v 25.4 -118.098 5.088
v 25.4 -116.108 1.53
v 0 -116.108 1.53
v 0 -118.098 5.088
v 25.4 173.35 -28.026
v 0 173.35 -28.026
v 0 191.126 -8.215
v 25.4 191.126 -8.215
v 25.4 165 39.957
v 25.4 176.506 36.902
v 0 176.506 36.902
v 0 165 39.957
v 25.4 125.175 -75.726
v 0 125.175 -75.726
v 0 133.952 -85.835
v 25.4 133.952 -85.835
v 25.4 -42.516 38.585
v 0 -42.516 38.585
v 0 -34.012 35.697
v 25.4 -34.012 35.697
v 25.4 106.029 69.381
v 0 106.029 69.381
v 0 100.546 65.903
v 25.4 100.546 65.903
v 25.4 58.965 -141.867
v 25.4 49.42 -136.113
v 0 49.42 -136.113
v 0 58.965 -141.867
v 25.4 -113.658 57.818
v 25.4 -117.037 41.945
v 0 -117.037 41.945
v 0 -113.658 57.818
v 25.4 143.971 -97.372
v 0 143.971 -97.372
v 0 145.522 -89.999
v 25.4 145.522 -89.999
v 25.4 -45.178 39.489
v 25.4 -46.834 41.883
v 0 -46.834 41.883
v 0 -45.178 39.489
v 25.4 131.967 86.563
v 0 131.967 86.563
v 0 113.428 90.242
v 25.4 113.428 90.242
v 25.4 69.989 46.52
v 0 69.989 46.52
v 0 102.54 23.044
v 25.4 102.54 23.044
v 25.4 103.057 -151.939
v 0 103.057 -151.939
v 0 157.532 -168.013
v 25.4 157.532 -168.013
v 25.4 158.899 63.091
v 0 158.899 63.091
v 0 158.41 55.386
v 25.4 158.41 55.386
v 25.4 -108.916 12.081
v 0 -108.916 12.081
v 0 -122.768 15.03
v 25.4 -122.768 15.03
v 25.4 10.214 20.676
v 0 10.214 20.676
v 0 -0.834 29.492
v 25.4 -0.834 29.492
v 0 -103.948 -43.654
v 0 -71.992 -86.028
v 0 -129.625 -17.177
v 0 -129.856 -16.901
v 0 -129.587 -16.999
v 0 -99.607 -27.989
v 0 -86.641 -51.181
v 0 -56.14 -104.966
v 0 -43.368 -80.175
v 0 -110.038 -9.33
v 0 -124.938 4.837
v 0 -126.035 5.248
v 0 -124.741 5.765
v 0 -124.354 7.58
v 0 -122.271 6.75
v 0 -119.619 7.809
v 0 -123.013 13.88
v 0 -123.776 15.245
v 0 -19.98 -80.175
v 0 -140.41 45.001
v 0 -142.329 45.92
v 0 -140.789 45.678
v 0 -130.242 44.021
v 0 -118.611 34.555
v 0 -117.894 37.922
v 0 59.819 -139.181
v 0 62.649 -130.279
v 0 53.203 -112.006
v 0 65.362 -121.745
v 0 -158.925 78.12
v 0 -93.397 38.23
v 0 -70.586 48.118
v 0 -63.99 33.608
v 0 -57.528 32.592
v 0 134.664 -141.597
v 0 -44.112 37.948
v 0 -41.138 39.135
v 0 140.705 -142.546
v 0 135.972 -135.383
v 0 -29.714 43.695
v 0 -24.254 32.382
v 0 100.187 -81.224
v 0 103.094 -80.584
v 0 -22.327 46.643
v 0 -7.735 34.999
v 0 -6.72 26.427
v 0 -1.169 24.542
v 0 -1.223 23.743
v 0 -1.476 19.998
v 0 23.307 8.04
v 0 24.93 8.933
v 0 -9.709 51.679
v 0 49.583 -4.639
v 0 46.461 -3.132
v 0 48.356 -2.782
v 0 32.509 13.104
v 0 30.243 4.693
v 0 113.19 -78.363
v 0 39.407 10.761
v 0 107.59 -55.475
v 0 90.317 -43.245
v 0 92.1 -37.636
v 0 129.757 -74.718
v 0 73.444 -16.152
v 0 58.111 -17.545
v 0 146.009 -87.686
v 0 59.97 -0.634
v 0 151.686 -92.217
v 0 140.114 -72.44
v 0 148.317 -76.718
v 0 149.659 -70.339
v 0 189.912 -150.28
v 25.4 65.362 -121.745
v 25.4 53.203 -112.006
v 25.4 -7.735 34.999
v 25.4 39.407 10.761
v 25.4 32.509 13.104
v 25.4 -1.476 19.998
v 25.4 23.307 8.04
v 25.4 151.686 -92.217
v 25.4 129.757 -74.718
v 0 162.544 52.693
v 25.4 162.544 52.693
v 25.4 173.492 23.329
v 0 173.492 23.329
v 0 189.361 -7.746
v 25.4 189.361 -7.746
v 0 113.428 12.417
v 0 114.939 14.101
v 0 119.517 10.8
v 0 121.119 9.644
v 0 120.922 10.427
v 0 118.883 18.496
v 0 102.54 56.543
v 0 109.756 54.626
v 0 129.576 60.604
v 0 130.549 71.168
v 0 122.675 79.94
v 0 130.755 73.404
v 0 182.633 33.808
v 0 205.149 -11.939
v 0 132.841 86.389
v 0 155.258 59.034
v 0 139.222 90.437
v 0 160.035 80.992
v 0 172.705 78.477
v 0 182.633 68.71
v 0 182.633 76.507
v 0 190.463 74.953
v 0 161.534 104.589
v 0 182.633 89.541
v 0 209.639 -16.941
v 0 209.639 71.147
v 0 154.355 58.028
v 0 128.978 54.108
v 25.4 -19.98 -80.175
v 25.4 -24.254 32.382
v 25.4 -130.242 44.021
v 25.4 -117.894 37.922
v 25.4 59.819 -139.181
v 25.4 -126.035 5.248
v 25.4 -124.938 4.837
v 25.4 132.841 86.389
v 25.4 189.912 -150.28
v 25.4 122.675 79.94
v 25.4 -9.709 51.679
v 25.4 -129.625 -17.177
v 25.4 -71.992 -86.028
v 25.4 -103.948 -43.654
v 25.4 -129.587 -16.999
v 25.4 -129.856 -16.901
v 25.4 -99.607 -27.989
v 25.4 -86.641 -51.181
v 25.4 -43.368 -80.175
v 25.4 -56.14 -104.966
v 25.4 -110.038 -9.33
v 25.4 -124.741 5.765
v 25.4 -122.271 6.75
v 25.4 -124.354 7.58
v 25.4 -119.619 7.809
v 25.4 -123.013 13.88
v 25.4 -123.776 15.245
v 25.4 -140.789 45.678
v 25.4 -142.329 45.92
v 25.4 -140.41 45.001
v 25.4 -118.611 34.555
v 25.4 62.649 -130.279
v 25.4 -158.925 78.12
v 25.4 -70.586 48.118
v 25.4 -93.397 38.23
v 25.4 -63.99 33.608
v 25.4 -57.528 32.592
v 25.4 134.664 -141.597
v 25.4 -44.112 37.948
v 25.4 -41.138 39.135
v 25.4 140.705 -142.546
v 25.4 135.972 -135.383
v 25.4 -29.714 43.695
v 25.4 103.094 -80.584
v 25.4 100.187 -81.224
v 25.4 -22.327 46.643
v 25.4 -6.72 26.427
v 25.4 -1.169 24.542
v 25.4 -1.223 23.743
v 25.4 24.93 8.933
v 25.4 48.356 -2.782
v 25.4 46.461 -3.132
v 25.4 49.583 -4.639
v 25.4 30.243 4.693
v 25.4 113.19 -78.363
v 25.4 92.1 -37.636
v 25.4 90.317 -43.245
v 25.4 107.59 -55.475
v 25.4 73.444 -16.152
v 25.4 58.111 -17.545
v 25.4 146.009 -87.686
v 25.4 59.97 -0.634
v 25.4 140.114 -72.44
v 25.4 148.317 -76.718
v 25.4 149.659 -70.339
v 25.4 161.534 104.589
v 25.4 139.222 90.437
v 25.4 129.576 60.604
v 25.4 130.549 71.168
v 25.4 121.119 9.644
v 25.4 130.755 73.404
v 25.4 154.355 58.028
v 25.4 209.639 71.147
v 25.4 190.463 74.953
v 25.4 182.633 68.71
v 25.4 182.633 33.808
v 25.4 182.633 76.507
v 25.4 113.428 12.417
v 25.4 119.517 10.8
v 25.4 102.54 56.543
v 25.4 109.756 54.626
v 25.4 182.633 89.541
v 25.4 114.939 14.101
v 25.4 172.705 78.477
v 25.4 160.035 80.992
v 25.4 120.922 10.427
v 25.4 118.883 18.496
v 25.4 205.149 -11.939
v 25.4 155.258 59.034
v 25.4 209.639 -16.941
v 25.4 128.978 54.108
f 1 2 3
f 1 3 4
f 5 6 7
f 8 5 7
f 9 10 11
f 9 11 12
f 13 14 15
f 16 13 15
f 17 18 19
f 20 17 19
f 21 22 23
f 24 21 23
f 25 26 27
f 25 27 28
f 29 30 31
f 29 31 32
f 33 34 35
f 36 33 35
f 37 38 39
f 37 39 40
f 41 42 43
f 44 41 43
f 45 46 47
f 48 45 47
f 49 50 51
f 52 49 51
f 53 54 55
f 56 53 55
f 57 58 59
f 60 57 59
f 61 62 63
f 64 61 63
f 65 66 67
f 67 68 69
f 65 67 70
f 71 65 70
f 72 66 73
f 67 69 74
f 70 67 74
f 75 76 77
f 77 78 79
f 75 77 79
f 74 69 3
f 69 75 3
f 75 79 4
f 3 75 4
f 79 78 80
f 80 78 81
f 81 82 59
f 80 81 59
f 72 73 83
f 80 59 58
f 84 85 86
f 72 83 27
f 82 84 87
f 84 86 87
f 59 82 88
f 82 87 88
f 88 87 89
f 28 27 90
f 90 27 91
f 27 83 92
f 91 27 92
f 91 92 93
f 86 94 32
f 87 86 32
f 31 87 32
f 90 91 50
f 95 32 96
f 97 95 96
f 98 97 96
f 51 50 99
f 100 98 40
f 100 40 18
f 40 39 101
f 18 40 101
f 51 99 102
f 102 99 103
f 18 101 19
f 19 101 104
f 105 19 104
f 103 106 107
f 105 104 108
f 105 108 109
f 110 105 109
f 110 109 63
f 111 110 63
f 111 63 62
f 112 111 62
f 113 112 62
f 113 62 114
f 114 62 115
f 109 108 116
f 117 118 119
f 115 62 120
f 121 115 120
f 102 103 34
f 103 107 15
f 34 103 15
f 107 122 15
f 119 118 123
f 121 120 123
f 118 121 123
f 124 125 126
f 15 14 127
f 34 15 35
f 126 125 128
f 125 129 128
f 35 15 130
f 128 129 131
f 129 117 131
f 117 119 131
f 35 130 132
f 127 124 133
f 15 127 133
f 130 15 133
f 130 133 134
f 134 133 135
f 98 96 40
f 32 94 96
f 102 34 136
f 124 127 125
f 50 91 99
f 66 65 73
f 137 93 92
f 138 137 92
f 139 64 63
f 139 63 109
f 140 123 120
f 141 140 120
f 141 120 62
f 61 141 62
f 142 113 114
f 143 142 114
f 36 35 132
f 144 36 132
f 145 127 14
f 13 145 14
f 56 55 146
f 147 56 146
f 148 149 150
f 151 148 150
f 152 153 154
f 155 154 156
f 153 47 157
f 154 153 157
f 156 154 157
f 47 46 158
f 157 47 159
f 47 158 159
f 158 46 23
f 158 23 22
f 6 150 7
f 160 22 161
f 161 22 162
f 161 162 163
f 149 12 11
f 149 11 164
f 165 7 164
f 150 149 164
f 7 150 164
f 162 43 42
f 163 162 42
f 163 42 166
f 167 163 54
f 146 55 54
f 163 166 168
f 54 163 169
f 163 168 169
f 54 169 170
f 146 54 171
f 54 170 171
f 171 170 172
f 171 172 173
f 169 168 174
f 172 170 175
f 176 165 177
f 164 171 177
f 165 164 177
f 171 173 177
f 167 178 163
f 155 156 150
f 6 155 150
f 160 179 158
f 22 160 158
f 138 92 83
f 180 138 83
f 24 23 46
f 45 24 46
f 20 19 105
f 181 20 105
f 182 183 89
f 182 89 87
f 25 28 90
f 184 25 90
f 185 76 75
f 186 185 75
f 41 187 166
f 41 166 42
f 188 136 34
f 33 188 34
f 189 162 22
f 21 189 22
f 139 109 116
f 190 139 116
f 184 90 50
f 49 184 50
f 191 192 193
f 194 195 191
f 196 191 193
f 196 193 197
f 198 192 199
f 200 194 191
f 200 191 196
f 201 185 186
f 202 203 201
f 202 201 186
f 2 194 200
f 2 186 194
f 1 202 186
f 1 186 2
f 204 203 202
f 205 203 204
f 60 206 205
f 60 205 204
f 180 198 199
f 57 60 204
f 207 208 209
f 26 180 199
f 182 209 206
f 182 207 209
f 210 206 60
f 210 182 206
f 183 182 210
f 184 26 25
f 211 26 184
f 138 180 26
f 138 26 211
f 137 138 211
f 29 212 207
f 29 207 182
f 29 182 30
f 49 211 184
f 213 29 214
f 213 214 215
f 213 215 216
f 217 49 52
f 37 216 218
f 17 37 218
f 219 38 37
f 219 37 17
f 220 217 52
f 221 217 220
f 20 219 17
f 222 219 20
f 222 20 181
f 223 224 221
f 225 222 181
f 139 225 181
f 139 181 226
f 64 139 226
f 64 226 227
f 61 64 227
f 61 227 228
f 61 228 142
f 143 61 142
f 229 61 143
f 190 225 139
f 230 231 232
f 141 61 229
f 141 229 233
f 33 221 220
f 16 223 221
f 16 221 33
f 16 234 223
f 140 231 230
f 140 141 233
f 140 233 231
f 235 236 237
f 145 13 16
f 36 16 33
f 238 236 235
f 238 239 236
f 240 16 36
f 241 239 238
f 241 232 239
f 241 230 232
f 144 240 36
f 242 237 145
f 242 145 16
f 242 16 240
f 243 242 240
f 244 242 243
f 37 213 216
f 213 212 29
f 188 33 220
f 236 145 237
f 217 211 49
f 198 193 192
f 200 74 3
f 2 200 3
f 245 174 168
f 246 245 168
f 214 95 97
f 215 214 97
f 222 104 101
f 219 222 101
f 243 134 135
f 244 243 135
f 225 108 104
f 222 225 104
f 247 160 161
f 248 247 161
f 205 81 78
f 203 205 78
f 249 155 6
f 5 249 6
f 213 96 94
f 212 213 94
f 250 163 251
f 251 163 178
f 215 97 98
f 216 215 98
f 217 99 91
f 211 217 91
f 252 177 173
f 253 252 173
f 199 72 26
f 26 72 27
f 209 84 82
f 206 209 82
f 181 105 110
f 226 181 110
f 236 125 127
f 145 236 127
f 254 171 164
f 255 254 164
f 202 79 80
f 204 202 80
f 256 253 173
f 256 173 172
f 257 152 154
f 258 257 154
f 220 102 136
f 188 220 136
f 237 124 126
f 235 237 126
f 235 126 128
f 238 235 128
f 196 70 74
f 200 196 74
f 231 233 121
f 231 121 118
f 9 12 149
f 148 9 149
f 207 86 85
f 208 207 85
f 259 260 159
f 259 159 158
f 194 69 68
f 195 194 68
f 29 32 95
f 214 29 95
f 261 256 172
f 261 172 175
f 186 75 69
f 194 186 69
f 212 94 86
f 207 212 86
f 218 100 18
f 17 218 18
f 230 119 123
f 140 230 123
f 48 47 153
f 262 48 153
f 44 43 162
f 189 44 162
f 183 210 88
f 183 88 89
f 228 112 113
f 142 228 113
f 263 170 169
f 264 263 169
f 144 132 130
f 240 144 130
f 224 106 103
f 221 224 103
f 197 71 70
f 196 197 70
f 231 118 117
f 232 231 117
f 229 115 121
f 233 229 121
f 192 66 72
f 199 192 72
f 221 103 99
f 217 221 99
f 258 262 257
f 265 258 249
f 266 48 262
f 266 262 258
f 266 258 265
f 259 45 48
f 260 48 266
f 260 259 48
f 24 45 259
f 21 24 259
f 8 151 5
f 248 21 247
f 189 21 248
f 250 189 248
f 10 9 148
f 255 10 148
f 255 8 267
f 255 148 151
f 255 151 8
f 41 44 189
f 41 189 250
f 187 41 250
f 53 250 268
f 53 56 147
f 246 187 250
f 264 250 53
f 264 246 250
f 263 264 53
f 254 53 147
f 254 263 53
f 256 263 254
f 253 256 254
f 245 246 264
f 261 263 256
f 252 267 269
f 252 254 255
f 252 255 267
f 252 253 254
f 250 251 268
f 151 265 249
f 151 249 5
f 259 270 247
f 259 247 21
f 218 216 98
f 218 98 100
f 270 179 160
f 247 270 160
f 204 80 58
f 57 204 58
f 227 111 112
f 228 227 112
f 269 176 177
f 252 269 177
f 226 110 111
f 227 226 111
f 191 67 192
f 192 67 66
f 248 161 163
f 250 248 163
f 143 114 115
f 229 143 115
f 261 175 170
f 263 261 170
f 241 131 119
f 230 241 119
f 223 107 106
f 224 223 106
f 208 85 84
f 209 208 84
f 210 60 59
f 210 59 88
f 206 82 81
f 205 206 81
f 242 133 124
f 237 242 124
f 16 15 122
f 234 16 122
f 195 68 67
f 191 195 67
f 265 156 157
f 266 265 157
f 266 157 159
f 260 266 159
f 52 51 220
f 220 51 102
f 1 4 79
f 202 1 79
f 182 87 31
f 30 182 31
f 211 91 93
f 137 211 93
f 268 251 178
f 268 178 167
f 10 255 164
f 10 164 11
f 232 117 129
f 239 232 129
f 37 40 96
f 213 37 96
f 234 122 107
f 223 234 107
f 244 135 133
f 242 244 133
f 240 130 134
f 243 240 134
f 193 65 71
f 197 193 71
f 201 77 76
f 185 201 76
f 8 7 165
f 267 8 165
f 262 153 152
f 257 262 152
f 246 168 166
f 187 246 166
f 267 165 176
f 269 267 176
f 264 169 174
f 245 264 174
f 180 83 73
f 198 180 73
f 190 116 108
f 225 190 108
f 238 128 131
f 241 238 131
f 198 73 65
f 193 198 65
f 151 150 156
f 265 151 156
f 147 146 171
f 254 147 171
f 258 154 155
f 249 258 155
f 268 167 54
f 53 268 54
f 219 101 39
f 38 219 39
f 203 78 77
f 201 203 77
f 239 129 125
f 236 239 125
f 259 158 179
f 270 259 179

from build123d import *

# Parameters (mm, degrees)
F1_DEPTH = 25.4
F3_DEPTH = 25.4


with BuildPart() as f1:
    # F0 (on Right) → F1 (new body)
    with BuildSketch(Plane.YZ):
        Polygon((39.4073710901, 10.7613735016), (32.5089133342, 13.1042615165), (24.9297516677, 8.9329942935), (30.2431357458, 4.6929819052), (46.4605966165, -3.132016269), (48.3558355785, -2.7815361279), align=None)
        Polygon((24.9297516677, 8.9329942935), (32.5089133342, 13.1042615165), (10.2135774235, 20.6763127113), align=None)
        Polygon((23.3068083269, 8.0397912375), (24.9297516677, 8.9329942935), (10.2135774235, 20.6763127113), (-1.1689106362, 24.5420890628), (-1.222905109, 23.743330227), (-1.4761048743, 19.9976588776), align=None)
        Polygon((-1.1689106362, 24.5420890628), (10.2135774235, 20.6763127113), (-0.8342821813, 29.4923630665), align=None)
        Polygon((-1.1689106362, 24.5420890628), (-0.8342821813, 29.4923630665), (-7.7347625359, 34.9988579404), (-6.7200334005, 26.4273885679), align=None)
        Polygon((49.5828269857, -4.6385065349), (48.3558355785, -2.7815361279), (46.4605966165, -3.132016269), align=None)
        Polygon((59.9696205611, -0.6338380901), (48.3558355785, -2.7815361279), (49.5828269857, -4.6385065349), (73.4443388703, -16.151793875), align=None)
        Polygon((-22.3268482951, 46.6431553377), (-7.7347625359, 34.9988579404), (-9.7094774246, 51.6793765128), align=None)
        Polygon((-6.7200334005, 26.4273885679), (-7.7347625359, 34.9988579404), (-22.3268482951, 46.6431553377), (-29.7137589349, 43.6946713656), (-24.2543756572, 32.3824877764), align=None)
        Polygon((73.4443388703, -16.151793875), (49.5828269857, -4.6385065349), (58.1108375432, -17.5450869263), (90.3166132239, -43.2448831119), (92.0996528139, -37.6359043615), align=None)
        Polygon((-34.01231224, 35.6965259976), (-24.2543756572, 32.3824877764), (-29.7137589349, 43.6946713656), (-41.1379831843, 39.1346944367), align=None)
        Polygon((92.0996528139, -37.6359043615), (90.3166132239, -43.2448831119), (101.9672765147, -52.541963082), (107.5895469178, -55.474606908), align=None)
        Polygon((-42.516093666, 38.5846219009), (-34.01231224, 35.6965259976), (-41.1379831843, 39.1346944367), align=None)
        Polygon((107.5895469178, -55.474606908), (101.9672765147, -52.541963082), (111.9833428928, -60.5346556677), align=None)
        Polygon((-42.516093666, 38.5846219009), (-41.1379831843, 39.1346944367), (-46.8339137733, 41.8830066919), (-45.1780543516, 39.4886900285), align=None)
        Polygon((-44.1122193164, 37.9475286522), (-42.516093666, 38.5846219009), (-45.1780543516, 39.4886900285), align=None)
        Polygon((140.1136179952, -72.4395533447), (107.5895469178, -55.474606908), (111.9833428928, -60.5346556677), (129.7573621524, -74.7180952129), align=None)
        Polygon((-57.5283219223, 32.5924938574), (-44.1122193164, 37.9475286522), (-45.1780543516, 39.4886900285), (-70.5856886666, 48.1177552528), (-63.9903102066, 33.6080833858), align=None)
        Polygon((149.6590868927, -70.339397568), (140.1136179952, -72.4395533447), (148.3167406935, -76.7184007516), align=None)
        Polygon((148.3167406935, -76.7184007516), (140.1136179952, -72.4395533447), (129.7573621524, -74.7180952129), (146.0087098869, -87.6864623983), align=None)
        Polygon((146.0087098869, -87.6864623983), (129.7573621524, -74.7180952129), (125.1747520192, -75.726342712), (133.9523863171, -85.8349726518), (145.5221718237, -89.9985543582), align=None)
        Polygon((-63.9903102066, 33.6080833858), (-70.5856886666, 48.1177552528), (-158.9251944029, 78.1200509185), (-140.788956998, 45.6780374064), (-130.242397169, 44.0205017918), (-117.0374682699, 41.9451672473), (-113.6579215527, 57.8182153404), (-93.3965852546, 38.2296802833), align=None)
        Polygon((151.6856447369, -92.2165836427), (146.0087098869, -87.6864623983), (145.5221718237, -89.9985543582), align=None)
        Polygon((133.9523863171, -85.8349726518), (113.1898287308, -78.3632174584), (103.0944412703, -80.5843641115), (100.1866939883, -81.2241150046), (135.9719039821, -135.3826654064), (143.9705200066, -97.3722049763), align=None)
        Polygon((145.5221718237, -89.9985543582), (133.9523863171, -85.8349726518), (143.9705200066, -97.3722049763), align=None)
        Polygon((189.9116674498, -150.2796334191), (143.9705200066, -97.3722049763), (135.9719039821, -135.3826654064), (140.7051781089, -142.5461629912), align=None)
        Polygon((-130.242397169, 44.0205017918), (-140.788956998, 45.6780374064), (-140.4103454299, 45.0007788696), (-118.6108332804, 34.5553896913), (-117.8940894802, 37.9217905028), align=None)
        Polygon((-140.4103454299, 45.0007788696), (-140.788956998, 45.6780374064), (-142.3288772839, 45.9200568667), align=None)
        Polygon((140.7051781089, -142.5461629912), (135.9719039821, -135.3826654064), (134.6642617875, -141.5967506605), align=None)
        Polygon((-118.6108332804, 34.5553896913), (-140.4103454299, 45.0007788696), (-123.7757925155, 15.2449712912), (-122.7679218686, 15.0303845328), align=None)
        Polygon((157.5321683144, -168.0127006283), (140.7051781089, -142.5461629912), (134.6642617875, -141.5967506605), (79.2779969723, -132.8920442936), (103.0574570546, -151.9392119201), align=None)
        Polygon((-122.7679218686, 15.0303845328), (-123.7757925155, 15.2449712912), (-123.0128165671, 13.880163615), align=None)
        Polygon((103.0574570546, -151.9392119201), (79.2779969723, -132.8920442936), (62.6494319525, -130.2786386725), (59.8193812369, -139.1812420779), align=None)
        Polygon((-108.9159250339, 12.0811418823), (-122.7679218686, 15.0303845328), (-123.0128165671, 13.880163615), (-119.6188585673, 7.8090680051), align=None)
        Polygon((-119.6188585673, 7.8090680051), (-123.0128165671, 13.880163615), (-124.3541446238, 7.580216748), (-122.2710626701, 6.7504412436), align=None)
        Polygon((62.6494319525, -130.2786386725), (65.3620428668, -121.7454703339), (53.2025559798, -112.0058133279), (21.9878875886, -98.4291027072), (-19.9804436727, -80.1751241088), (-43.3675872791, -80.1751241088), (49.4200160338, -136.1127709415), (59.8193812369, -139.1812420779), align=None)
        Polygon((-122.2710626701, 6.7504412436), (-124.3541446238, 7.580216748), (-124.7406902911, 5.76468985), align=None)
        Polygon((58.9654996082, -141.8673315722), (59.8193812369, -139.1812420779), (49.4200160338, -136.1127709415), align=None)
        Polygon((-118.0976969364, 5.0880214572), (-122.2710626701, 6.7504412436), (-124.7406902911, 5.76468985), (-124.9381516575, 4.8372537093), (-116.108420104, 1.529612707), align=None)
        Polygon((-124.9381516575, 4.8372537093), (-124.7406902911, 5.76468985), (-126.0349099858, 5.2481023058), align=None)
        Polygon((-56.1404097384, -104.9657621289), (49.4200160338, -136.1127709415), (-43.3675872791, -80.1751241088), (-65.8273250908, -66.6351162111), (-71.9922287598, -86.0282995543), align=None)
        Polygon((-110.0376887171, -9.3296821557), (-116.108420104, 1.529612707), (-124.9381516575, 4.8372537093), (-129.587407974, -16.9993638265), (-99.6067174554, -27.9885529602), align=None)
        Polygon((-129.6251811398, -17.1767767546), (-129.587407974, -16.9993638265), (-129.8561379403, -16.9008629456), align=None)
        Polygon((-99.6067174554, -27.9885529602), (-129.587407974, -16.9993638265), (-129.6251811398, -17.1767767546), (-71.9922287598, -86.0282995543), (-65.8273250908, -66.6351162111), (-84.1907179332, -55.5646181403), (-103.948444128, -43.653536588), (-86.6411600678, -51.1812791342), (-95.4205706262, -35.4767121061), align=None)
    extrude(amount=F1_DEPTH)


with BuildPart() as f3:
    # F2 (on Right) → F3 (new body)
    with BuildSketch(Plane.YZ):
        Polygon((182.6326102018, 49.1656479155), (182.6326102018, 39.6044664085), (182.6326102018, 35.2749967557), (209.6393406391, 28.1037189108), (209.6393406391, 46.6781857364), align=None)
        Polygon((182.6326102018, 68.7096794922), (182.6326102018, 49.1656479155), (209.6393406391, 46.6781857364), (209.6393406391, 71.1466726798), (190.4628341321, 74.9526959447), align=None)
        Polygon((209.6393406391, 28.1037189108), (182.6326102018, 35.2749967557), (182.6326102018, 33.8075737448), (176.5059347614, 36.9018538812), (165.0003189524, 39.9570170353), (173.4916588605, 23.3289209383), (196.4655467816, -2.2647932405), (209.6393406391, 12.4165520464), align=None)
        Polygon((158.4095897006, 55.386132115), (162.5435971477, 52.6927634844), (182.6326102018, 68.7096794922), (182.6326102018, 76.5067858118), (172.7050465336, 78.4771414796), (158.8987850052, 63.090951684), align=None)
        Polygon((182.6326102018, 76.5067858118), (182.6326102018, 68.7096794922), (190.4628341321, 74.9526959447), align=None)
        Polygon((172.7050465336, 78.4771414796), (182.6326102018, 76.5067858118), (182.6326102018, 89.5407721731), align=None)
        Polygon((209.6393406391, -13.1311215666), (209.6393406391, 12.4165520464), (196.4655467816, -2.2647932405), (205.1493626653, -11.9388676711), align=None)
        Polygon((155.2584235223, 59.0340031332), (158.8987850052, 63.090951684), (160.0353438442, 80.9917383473), (142.24203746, 84.5232334105), align=None)
        Polygon((160.0353438442, 80.9917383473), (158.8987850052, 63.090951684), (172.7050465336, 78.4771414796), align=None)
        Polygon((209.6393406391, -16.9408600777), (209.6393406391, -13.1311215666), (205.1493626653, -11.9388676711), align=None)
        Polygon((191.1261623851, -8.2151934664), (196.4655467816, -2.2647932405), (173.4916588605, 23.3289209383), (189.3606414498, -7.7463828787), align=None)
        Polygon((205.1493626653, -11.9388676711), (196.4655467816, -2.2647932405), (191.1261623851, -8.2151934664), align=None)
        Polygon((130.7550188197, 73.4035050054), (154.3553188702, 58.0275511291), (155.2584235223, 59.0340031332), (142.24203746, 84.5232334105), (132.8412715433, 86.3890338249), (131.8958162431, 85.7893047802), align=None)
        Polygon((142.24203746, 84.5232334105), (160.0353438442, 80.9917383473), (161.5336090326, 104.589395225), (139.2222647451, 90.4366783365), align=None)
        Polygon((173.350011706, -28.0255691877), (191.1261623851, -8.2151934664), (189.3606414498, -7.7463828787), (120.9215474918, 10.426707691), (121.1193015164, 9.6438529898), align=None)
        Polygon((130.5491515757, 71.1683750762), (130.7550188197, 73.4035050054), (131.8958162431, 85.7893047802), (122.6751000902, 79.9403436625), align=None)
        Polygon((132.8412715433, 86.3890338249), (142.24203746, 84.5232334105), (139.2222647451, 90.4366783365), align=None)
        Polygon((121.1193015164, 9.6438529898), (120.9215474918, 10.426707691), (119.5165297261, 10.7997914598), align=None)
        Polygon((119.5165297261, 10.7997914598), (120.9215474918, 10.426707691), (118.8831637772, 18.4961175402), (114.9393053821, 14.1009412161), align=None)
        Polygon((122.6751000902, 79.9403436625), (131.8958162431, 85.7893047802), (131.9670358532, 86.5625462096), (113.4278774261, 90.2420729399), align=None)
        Polygon((131.9670358532, 86.5625462096), (131.8958162431, 85.7893047802), (132.8412715433, 86.3890338249), align=None)
        Polygon((129.5760975213, 60.6037889011), (130.5491515757, 71.1683750762), (122.6751000902, 79.9403436625), (106.0292229683, 69.381392878), (109.4327523501, 55.9077405336), (128.9777589912, 54.107542434), align=None)
        Polygon((113.4278774261, 12.4165520464), (119.5165297261, 10.7997914598), (114.9393053821, 14.1009412161), align=None)
        Polygon((114.9393053821, 14.1009412161), (118.8831637772, 18.4961175402), (109.7564548376, 54.6262899306), (102.5395625172, 56.5426396393), (100.9748271614, 56.6867600105), (102.5395625172, 23.0437862813), align=None)
        Polygon((109.4327523501, 55.9077405336), (106.0292229683, 69.381392878), (100.5461641487, 65.9033335484), (100.9748271614, 56.6867600105), (102.5395625172, 56.5426396393), align=None)
        Polygon((69.9886954974, 46.519866686), (102.5395625172, 23.0437862813), (100.9748271614, 56.6867600105), (100.5461641487, 65.9033335484), align=None)
    extrude(amount=F3_DEPTH)


solid = Compound([f1.part, f3.part])
